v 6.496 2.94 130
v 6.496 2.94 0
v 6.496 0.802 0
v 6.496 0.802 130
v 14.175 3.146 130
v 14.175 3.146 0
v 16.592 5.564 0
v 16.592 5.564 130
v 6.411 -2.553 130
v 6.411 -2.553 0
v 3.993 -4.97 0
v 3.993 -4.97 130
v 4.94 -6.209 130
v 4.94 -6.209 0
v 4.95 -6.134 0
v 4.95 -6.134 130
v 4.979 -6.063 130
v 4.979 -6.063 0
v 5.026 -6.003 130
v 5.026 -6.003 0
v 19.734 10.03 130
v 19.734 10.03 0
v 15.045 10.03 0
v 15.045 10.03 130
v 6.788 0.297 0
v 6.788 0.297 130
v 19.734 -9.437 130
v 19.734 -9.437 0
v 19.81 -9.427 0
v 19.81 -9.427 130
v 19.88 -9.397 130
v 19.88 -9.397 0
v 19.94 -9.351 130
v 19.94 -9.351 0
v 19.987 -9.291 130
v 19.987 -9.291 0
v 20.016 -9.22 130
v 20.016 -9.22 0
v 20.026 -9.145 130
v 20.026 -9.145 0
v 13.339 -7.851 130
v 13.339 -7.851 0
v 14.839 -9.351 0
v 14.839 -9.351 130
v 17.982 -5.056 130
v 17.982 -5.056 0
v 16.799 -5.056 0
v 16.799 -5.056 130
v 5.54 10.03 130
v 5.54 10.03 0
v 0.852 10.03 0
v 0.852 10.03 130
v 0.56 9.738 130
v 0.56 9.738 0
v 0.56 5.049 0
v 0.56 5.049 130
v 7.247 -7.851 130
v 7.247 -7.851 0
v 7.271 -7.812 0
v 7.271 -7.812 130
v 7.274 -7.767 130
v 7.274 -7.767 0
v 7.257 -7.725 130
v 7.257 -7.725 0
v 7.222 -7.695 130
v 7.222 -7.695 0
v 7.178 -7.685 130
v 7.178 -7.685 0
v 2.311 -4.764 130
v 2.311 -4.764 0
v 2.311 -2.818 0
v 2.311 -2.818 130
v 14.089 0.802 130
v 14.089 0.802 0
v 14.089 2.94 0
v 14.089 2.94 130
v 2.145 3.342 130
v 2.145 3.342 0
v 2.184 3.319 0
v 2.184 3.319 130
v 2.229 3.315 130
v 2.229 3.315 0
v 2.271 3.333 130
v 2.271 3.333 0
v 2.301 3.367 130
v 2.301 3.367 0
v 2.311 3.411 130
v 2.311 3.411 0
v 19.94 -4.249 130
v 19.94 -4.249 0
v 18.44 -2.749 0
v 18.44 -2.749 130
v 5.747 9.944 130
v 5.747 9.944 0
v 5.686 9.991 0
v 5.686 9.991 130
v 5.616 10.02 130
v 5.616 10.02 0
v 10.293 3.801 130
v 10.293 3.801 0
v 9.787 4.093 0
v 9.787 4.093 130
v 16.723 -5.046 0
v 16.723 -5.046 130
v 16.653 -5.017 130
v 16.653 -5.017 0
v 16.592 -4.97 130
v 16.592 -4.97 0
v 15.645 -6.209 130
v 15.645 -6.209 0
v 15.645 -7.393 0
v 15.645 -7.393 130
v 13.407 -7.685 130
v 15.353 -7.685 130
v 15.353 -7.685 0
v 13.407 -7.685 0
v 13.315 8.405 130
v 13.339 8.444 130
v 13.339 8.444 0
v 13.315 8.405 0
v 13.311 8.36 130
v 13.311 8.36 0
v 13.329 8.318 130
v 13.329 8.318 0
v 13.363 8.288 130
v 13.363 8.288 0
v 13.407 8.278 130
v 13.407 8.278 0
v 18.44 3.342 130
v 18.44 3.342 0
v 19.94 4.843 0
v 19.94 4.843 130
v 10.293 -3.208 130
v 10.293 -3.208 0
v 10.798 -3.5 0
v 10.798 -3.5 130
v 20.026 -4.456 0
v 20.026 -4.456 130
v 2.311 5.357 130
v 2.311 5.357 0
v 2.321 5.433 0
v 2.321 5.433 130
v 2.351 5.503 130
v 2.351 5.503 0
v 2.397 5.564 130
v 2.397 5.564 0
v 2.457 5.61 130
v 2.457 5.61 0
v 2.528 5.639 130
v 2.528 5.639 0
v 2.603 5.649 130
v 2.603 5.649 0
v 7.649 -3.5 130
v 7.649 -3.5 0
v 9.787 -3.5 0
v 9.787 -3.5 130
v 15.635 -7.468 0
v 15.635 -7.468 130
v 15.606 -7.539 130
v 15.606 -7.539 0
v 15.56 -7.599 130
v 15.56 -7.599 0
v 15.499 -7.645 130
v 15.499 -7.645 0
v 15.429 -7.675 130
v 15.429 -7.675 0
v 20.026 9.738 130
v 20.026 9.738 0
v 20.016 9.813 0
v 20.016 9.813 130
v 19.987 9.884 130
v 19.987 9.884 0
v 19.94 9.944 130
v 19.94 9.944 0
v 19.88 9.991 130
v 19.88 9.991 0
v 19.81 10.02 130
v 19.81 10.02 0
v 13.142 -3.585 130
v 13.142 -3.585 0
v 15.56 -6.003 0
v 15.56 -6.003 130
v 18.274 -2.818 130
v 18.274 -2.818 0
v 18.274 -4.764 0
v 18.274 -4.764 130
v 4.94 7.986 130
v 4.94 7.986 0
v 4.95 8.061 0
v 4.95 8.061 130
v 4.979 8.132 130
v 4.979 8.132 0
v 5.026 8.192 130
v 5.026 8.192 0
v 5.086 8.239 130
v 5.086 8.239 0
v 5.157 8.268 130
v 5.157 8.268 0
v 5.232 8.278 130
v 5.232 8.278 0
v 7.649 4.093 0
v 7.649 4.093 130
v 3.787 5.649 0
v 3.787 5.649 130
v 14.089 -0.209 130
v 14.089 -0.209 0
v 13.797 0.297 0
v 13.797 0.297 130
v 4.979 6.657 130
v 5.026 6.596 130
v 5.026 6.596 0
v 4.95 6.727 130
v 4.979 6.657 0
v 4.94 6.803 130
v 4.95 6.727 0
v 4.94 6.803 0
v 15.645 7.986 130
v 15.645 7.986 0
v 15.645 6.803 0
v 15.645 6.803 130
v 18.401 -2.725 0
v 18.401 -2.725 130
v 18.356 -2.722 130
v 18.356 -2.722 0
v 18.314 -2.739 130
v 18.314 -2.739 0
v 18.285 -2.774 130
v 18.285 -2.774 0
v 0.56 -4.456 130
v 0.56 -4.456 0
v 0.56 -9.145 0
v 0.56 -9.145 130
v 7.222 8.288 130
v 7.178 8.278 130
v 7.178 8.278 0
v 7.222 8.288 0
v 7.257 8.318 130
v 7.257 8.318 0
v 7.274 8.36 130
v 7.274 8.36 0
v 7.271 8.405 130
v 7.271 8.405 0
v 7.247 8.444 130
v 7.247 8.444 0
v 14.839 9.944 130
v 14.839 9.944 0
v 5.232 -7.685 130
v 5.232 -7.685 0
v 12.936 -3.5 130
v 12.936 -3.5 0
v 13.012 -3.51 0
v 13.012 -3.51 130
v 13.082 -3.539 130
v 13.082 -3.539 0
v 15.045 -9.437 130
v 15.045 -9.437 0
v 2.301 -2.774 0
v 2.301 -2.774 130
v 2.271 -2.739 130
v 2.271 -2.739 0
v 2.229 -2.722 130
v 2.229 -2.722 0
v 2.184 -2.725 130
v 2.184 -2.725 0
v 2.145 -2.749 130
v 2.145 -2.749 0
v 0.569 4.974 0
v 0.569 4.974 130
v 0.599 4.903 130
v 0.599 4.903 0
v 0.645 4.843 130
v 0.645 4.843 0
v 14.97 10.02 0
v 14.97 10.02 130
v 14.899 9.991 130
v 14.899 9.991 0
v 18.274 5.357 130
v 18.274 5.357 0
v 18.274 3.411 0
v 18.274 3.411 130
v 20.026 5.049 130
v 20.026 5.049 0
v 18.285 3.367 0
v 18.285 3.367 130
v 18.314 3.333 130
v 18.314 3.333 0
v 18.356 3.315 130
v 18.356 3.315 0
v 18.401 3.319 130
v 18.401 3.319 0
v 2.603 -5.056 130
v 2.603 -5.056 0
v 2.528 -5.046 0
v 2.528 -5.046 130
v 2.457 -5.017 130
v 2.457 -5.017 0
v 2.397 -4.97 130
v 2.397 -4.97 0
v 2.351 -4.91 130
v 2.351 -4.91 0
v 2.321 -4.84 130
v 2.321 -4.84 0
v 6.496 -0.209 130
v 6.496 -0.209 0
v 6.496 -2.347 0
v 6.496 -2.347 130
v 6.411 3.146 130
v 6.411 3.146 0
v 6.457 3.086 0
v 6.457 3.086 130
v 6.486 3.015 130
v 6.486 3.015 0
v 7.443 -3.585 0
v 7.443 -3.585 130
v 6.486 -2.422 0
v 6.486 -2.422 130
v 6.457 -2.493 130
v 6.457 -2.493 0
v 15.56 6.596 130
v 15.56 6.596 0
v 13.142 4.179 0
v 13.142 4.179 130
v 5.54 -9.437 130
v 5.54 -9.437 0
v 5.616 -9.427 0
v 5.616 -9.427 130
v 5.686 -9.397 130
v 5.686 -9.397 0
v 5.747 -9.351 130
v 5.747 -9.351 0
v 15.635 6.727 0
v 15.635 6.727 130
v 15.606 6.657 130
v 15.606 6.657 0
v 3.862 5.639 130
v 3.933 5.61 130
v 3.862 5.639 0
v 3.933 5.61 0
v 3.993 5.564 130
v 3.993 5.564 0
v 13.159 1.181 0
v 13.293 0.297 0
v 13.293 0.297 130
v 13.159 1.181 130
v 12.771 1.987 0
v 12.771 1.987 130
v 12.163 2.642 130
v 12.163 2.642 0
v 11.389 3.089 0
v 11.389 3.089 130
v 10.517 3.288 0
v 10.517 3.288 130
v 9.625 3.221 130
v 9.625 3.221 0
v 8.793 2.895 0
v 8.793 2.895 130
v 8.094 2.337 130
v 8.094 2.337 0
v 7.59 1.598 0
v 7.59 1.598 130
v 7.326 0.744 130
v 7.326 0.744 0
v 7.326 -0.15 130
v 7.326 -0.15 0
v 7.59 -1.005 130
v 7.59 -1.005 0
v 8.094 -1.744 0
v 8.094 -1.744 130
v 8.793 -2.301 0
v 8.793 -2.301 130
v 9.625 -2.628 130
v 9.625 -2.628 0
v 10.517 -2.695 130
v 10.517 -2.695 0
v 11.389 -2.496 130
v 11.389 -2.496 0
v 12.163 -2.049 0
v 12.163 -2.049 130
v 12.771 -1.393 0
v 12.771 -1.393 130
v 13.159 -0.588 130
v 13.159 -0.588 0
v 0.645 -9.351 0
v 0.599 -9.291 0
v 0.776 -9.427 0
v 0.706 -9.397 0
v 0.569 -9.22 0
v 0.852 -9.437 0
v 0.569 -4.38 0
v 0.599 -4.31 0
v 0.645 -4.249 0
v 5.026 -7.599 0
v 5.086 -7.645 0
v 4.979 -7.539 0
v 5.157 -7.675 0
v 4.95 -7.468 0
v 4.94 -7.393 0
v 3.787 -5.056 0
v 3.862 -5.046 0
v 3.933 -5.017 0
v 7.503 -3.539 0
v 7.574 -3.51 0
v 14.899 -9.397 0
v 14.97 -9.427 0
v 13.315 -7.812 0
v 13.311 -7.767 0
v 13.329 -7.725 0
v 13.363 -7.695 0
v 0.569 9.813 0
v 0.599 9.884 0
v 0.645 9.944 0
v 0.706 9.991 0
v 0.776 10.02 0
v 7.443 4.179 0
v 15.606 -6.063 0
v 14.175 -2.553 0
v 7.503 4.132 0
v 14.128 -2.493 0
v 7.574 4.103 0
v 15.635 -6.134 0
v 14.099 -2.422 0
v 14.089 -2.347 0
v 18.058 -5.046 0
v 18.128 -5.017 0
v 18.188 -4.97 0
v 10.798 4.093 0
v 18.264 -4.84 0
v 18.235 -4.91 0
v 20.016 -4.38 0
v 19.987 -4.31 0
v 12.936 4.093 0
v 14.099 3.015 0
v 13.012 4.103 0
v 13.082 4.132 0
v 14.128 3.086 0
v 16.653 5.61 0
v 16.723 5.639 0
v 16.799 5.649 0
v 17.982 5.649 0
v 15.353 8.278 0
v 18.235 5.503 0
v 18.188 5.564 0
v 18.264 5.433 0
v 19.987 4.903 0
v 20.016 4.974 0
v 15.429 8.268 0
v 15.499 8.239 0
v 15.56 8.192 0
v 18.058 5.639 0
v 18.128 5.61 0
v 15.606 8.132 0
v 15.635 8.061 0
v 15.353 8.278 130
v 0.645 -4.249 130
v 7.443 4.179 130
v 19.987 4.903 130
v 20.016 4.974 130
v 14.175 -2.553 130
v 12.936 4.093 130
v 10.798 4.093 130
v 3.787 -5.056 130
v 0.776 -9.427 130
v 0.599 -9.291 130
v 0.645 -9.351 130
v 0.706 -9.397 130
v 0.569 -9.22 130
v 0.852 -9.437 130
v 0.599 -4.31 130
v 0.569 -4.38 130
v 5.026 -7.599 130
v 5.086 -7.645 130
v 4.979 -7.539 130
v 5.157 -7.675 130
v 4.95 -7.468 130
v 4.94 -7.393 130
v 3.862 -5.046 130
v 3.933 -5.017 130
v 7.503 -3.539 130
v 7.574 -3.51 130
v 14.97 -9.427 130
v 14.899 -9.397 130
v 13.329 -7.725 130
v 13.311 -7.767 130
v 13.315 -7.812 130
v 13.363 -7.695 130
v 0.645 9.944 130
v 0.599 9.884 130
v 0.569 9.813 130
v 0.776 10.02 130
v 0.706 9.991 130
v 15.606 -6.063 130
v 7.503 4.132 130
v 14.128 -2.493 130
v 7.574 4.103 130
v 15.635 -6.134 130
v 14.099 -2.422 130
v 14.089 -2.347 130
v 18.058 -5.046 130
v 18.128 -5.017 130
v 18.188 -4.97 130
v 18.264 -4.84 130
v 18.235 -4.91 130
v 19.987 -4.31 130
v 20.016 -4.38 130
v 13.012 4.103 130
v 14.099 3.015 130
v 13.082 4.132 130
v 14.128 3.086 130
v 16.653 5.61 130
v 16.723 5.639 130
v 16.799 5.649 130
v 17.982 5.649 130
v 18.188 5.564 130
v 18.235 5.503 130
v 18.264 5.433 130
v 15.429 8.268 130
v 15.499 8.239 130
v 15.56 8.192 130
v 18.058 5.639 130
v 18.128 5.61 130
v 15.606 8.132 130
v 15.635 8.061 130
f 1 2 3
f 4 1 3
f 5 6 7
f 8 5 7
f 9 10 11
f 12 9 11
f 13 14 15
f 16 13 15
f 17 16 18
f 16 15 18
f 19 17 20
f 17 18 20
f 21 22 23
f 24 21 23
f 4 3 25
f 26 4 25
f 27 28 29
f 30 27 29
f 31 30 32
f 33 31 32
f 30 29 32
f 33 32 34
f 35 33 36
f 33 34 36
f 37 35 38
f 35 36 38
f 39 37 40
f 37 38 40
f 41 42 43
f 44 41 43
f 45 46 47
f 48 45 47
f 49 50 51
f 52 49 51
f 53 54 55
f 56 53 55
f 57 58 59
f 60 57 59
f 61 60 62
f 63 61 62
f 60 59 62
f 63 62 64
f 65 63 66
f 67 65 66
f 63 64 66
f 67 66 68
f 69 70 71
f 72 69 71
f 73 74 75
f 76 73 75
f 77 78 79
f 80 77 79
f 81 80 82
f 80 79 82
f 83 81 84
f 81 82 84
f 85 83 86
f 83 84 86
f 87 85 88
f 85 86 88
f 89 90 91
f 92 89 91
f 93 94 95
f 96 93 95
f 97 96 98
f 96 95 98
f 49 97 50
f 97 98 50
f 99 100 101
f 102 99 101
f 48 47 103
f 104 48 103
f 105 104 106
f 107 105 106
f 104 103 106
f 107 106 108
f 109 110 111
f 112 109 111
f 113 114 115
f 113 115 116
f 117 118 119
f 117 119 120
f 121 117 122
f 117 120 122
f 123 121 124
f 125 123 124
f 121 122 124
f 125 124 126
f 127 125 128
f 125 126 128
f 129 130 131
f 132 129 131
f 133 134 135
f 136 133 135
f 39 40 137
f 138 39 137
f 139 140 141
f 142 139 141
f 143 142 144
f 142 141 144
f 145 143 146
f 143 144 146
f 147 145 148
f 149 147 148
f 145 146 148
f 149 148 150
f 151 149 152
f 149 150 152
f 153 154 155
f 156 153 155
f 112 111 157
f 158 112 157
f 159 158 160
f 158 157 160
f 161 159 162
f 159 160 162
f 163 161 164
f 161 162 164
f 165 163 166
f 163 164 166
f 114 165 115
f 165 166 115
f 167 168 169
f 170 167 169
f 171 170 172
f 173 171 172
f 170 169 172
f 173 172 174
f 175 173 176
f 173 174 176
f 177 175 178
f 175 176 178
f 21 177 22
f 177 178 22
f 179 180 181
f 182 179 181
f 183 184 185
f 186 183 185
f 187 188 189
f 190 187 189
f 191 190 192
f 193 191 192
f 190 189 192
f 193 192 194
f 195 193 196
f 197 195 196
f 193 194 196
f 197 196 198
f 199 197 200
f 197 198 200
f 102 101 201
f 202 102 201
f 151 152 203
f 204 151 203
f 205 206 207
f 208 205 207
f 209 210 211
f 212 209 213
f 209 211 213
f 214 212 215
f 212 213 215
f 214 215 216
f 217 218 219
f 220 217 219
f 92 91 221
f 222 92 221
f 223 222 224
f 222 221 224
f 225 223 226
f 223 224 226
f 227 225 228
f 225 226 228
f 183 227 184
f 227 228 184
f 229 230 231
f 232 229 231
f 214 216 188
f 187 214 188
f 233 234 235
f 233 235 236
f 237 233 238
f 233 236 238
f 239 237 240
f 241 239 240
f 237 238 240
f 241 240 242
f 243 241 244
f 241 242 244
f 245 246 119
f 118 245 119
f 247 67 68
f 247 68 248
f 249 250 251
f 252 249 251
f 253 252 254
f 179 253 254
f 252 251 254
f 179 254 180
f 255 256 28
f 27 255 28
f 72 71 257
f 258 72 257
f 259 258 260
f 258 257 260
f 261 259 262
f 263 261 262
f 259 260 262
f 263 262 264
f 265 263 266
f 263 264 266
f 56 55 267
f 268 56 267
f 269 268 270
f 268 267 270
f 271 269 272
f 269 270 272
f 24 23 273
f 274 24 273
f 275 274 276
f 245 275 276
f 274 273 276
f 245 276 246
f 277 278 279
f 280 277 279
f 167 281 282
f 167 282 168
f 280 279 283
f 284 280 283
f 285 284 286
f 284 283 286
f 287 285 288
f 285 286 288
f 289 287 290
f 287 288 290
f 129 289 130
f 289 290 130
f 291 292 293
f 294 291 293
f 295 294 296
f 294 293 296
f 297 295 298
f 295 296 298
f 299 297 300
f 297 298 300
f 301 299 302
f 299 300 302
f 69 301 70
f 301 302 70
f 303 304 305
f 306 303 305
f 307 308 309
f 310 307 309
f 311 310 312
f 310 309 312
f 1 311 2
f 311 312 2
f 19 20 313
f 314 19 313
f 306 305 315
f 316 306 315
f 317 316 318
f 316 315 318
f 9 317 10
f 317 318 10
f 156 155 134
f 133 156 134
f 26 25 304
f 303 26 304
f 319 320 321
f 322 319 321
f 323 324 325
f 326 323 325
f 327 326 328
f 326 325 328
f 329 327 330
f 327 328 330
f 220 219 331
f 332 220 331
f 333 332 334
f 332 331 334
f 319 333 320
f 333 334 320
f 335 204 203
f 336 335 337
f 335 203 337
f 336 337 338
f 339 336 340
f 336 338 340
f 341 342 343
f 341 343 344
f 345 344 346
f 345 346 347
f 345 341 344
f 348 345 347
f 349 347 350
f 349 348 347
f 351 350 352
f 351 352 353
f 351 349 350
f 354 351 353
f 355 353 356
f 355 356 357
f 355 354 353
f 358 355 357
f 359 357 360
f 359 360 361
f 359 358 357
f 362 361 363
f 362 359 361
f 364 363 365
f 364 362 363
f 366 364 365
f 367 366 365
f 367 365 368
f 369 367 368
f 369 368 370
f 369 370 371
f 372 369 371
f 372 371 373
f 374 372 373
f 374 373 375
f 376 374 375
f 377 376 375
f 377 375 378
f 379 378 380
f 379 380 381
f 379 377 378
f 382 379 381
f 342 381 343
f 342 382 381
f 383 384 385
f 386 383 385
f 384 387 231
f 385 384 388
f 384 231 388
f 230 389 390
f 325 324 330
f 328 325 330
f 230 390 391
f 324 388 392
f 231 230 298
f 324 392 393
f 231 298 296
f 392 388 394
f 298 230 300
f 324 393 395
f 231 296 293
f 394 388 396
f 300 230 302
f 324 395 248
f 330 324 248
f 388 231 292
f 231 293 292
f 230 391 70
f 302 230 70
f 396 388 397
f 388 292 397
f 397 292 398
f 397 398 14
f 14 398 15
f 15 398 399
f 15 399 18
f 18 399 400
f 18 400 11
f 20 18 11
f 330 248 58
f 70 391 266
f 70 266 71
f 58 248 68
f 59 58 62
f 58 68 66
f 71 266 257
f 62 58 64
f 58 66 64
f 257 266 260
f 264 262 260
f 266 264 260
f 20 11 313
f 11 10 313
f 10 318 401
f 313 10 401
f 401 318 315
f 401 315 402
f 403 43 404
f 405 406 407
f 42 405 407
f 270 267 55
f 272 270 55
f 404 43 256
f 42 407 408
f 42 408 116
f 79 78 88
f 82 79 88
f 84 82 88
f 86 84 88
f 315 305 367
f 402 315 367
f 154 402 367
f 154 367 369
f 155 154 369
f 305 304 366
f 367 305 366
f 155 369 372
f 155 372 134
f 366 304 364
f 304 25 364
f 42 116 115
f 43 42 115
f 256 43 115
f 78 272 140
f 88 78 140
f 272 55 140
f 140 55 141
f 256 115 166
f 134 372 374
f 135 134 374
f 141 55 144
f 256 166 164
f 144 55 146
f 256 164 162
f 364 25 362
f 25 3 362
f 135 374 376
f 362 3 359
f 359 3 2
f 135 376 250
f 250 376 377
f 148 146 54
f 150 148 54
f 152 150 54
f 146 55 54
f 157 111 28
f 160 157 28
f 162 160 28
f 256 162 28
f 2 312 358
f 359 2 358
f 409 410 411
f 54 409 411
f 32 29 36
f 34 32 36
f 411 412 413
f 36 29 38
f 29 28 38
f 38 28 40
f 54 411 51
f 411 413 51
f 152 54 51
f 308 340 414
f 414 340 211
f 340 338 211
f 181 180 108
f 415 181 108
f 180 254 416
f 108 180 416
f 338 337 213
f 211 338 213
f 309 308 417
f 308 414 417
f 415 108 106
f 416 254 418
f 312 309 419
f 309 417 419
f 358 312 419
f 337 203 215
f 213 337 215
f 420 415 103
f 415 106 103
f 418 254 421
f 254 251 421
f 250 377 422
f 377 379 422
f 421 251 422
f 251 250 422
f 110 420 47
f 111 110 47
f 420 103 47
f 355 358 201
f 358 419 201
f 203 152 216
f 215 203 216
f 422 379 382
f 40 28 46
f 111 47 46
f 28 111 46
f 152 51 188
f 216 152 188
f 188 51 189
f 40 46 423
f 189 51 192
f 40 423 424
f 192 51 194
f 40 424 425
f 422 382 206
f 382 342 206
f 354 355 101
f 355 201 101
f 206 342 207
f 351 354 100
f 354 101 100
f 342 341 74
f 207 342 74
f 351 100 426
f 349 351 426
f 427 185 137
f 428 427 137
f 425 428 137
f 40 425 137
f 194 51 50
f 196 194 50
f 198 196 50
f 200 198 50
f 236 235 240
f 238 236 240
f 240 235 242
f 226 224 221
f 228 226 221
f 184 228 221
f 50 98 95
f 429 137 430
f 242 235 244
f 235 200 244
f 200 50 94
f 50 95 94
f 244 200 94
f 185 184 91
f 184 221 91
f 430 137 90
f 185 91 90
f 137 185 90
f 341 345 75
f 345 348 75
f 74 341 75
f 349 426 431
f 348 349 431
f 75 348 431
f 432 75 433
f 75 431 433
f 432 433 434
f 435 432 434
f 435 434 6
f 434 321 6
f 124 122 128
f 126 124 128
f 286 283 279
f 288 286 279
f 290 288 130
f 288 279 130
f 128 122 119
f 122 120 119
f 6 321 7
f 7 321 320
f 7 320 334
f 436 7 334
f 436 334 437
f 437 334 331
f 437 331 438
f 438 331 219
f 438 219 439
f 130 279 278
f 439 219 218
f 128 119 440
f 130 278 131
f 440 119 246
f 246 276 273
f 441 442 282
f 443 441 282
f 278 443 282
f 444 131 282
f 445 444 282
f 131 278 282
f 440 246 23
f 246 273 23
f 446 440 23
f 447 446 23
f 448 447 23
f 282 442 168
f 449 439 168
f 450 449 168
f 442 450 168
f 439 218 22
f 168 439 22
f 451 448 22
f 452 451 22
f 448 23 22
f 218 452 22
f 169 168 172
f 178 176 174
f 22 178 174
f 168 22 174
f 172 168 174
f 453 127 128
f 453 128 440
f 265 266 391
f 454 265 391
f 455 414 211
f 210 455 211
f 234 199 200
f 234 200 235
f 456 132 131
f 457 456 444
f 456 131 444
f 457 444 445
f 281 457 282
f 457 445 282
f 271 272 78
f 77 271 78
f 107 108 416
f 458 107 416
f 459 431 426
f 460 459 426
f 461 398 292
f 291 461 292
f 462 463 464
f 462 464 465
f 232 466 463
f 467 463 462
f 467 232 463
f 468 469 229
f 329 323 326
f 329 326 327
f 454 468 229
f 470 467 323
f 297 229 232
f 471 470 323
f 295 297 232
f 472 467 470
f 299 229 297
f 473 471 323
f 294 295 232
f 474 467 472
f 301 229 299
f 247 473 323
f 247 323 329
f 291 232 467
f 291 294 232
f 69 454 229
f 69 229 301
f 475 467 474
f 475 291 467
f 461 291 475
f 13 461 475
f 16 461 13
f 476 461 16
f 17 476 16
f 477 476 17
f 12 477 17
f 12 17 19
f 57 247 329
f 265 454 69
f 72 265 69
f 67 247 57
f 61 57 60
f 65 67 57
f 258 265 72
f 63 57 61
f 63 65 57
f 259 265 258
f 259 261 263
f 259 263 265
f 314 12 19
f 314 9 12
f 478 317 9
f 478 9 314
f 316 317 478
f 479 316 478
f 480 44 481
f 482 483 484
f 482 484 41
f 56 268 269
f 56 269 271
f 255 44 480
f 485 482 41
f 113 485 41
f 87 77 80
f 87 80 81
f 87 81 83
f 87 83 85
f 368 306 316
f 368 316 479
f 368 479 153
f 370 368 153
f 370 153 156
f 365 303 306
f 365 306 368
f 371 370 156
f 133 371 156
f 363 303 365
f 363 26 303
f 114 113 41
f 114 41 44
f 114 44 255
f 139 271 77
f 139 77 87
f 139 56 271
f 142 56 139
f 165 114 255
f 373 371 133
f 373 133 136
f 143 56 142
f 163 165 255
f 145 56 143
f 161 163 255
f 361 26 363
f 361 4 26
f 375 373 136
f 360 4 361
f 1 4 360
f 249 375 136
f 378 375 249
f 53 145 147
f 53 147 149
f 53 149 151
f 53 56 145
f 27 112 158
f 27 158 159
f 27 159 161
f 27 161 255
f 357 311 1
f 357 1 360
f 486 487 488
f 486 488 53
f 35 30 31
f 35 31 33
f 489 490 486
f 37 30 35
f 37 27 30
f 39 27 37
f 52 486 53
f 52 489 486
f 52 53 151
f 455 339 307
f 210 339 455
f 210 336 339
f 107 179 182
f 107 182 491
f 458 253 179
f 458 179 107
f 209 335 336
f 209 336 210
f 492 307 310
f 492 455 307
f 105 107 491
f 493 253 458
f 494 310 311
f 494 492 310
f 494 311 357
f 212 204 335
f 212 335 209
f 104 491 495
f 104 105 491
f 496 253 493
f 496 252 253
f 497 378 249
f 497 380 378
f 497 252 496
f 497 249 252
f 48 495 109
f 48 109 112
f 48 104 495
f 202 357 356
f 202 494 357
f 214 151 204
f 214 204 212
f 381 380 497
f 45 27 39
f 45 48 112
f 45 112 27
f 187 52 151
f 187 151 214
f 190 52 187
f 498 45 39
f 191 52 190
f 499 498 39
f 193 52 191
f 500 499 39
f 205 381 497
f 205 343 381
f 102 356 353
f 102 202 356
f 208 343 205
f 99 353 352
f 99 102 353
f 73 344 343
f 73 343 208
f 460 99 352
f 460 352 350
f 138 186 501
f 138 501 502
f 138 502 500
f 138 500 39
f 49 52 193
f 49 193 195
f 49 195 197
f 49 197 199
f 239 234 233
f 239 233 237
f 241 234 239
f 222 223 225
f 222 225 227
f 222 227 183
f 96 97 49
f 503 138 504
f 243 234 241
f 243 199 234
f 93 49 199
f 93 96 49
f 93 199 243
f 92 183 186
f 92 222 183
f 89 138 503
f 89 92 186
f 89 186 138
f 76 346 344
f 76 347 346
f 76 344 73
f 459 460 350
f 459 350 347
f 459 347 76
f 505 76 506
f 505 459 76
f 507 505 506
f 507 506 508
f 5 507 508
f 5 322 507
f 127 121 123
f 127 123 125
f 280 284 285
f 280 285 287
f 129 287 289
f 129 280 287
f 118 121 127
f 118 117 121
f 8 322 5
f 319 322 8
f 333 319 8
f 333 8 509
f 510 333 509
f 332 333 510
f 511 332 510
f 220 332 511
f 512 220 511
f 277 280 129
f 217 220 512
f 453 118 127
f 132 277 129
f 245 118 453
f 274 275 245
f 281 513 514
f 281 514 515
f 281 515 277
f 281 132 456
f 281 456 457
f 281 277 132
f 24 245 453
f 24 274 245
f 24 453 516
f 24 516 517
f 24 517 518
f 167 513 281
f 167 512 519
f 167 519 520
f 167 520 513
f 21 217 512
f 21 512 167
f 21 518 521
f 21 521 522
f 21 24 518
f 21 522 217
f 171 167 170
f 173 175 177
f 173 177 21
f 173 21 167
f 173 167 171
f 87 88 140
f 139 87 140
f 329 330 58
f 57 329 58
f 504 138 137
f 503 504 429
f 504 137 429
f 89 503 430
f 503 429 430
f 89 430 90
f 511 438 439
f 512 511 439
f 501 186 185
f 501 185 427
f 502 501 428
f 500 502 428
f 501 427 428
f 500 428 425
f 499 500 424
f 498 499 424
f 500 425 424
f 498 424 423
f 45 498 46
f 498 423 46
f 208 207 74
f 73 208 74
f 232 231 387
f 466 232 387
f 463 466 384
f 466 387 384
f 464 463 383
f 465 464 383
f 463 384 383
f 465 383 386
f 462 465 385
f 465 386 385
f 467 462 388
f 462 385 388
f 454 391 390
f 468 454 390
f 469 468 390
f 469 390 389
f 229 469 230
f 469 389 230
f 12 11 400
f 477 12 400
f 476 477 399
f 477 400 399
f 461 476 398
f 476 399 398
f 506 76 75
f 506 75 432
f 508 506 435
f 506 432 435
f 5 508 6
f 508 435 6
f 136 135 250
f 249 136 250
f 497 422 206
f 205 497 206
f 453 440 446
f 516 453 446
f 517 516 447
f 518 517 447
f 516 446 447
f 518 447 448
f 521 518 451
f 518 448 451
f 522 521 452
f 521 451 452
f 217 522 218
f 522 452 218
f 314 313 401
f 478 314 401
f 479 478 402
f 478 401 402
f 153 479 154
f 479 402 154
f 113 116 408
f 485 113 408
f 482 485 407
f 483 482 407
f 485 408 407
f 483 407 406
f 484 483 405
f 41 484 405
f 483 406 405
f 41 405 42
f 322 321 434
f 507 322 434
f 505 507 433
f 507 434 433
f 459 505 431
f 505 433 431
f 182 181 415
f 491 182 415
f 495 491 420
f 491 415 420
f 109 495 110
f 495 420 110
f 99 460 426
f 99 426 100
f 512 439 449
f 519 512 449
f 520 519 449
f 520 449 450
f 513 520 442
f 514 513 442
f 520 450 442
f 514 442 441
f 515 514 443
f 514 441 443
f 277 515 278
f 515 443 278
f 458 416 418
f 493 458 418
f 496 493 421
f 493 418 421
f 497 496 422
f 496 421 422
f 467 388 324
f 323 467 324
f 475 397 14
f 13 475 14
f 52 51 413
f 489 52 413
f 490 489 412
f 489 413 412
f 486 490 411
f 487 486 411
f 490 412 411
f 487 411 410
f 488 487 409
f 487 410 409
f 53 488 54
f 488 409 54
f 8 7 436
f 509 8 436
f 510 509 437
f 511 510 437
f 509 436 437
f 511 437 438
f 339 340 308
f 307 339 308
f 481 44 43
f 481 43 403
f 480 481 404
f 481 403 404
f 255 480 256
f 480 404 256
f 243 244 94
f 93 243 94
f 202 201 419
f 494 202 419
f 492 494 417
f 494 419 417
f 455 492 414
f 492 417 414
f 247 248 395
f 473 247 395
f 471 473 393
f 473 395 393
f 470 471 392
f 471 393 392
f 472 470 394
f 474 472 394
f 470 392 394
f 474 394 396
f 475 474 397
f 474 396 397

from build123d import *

# Parameters (mm, degrees)
ESQUISSE1_R        = 3
BOSS_EXTRU_1_DEPTH = 130


with BuildPart() as part:
    # Esquisse1 → Boss.-Extru.1 (new body)
    with BuildSketch(Plane.XY):
        with BuildLine():
            Line((18.273972397, -2.817988329), (18.273972397, -4.763988771))
            ThreePointArc((18.273972397, -4.763988771), (18.188448617, -4.970461441), (17.981975947, -5.055985222))
            Line((17.981975947, -5.055985222), (16.798674025, -5.055985222))
            ThreePointArc((16.798674025, -5.055985222), (16.686931822, -5.033758315), (16.592201355, -4.970461441))
            Line((16.592201355, -4.970461441), (14.174856283, -2.553116369))
            ThreePointArc((14.174856283, -2.553116369), (14.111559409, -2.458385902), (14.089332502, -2.346643699))
            Line((14.089332502, -2.346643699), (14.089332502, -0.209112213))
            Line((14.089332502, -0.209112213), (13.797336052, 0.296640474))
            Line((13.797336052, 0.296640474), (14.089332502, 0.802393162))
            Line((14.089332502, 0.802393162), (14.089332502, 2.939924647))
            ThreePointArc((14.089332502, 2.939924647), (14.111559409, 3.051666851), (14.174856283, 3.146397317))
            Line((14.174856283, 3.146397317), (16.592201355, 5.56374239))
            ThreePointArc((16.592201355, 5.56374239), (16.686931822, 5.627039264), (16.798674025, 5.64926617))
            Line((16.798674025, 5.64926617), (17.981975947, 5.64926617))
            ThreePointArc((17.981975947, 5.64926617), (18.188448617, 5.56374239), (18.273972397, 5.35726972))
            Line((18.273972397, 5.35726972), (18.273972397, 3.411269278))
            ThreePointArc((18.273972397, 3.411269278), (18.334057146, 3.321346096), (18.440128771, 3.342445054))
            Line((18.440128771, 3.342445054), (19.940427319, 4.842743602))
            ThreePointArc((19.940427319, 4.842743602), (20.003724193, 4.937474069), (20.025951099, 5.049216272))
            Line((20.025951099, 5.049216272), (20.025951099, 9.737859034))
            ThreePointArc((20.025951099, 9.737859034), (19.940427319, 9.944331704), (19.733954649, 10.029855484))
            Line((19.733954649, 10.029855484), (15.045311887, 10.029855484))
            ThreePointArc((15.045311887, 10.029855484), (14.933569683, 10.007628578), (14.838839217, 9.944331704))
            Line((14.838839217, 9.944331704), (13.338540669, 8.444033156))
            ThreePointArc((13.338540669, 8.444033156), (13.317441711, 8.337961531), (13.407364892, 8.277876782))
            Line((13.407364892, 8.277876782), (15.353365335, 8.277876782))
            ThreePointArc((15.353365335, 8.277876782), (15.559838005, 8.192353002), (15.645361785, 7.985880332))
            Line((15.645361785, 7.985880332), (15.645361785, 6.802578411))
            ThreePointArc((15.645361785, 6.802578411), (15.623134879, 6.690836207), (15.559838005, 6.596105741))
            Line((15.559838005, 6.596105741), (13.142492932, 4.178760668))
            ThreePointArc((13.142492932, 4.178760668), (13.047762466, 4.115463794), (12.936020262, 4.093236888))
            Line((12.936020262, 4.093236888), (10.798488777, 4.093236888))
            Line((10.798488777, 4.093236888), (10.292736089, 3.801240437))
            Line((10.292736089, 3.801240437), (9.786983402, 4.093236888))
            Line((9.786983402, 4.093236888), (7.649451916, 4.093236888))
            ThreePointArc((7.649451916, 4.093236888), (7.537709712, 4.115463794), (7.442979246, 4.178760668))
            Line((7.442979246, 4.178760668), (5.025634173, 6.596105741))
            ThreePointArc((5.025634173, 6.596105741), (4.962337299, 6.690836207), (4.940110393, 6.802578411))
            Line((4.940110393, 6.802578411), (4.940110393, 7.985880332))
            ThreePointArc((4.940110393, 7.985880332), (5.025634173, 8.192353002), (5.232106843, 8.277876782))
            Line((5.232106843, 8.277876782), (7.178107286, 8.277876782))
            ThreePointArc((7.178107286, 8.277876782), (7.268030467, 8.337961531), (7.246931509, 8.444033156))
            Line((7.246931509, 8.444033156), (5.746632961, 9.944331704))
            ThreePointArc((5.746632961, 9.944331704), (5.651902495, 10.007628578), (5.540160291, 10.029855484))
            Line((5.540160291, 10.029855484), (0.85151753, 10.029855484))
            ThreePointArc((0.85151753, 10.029855484), (0.64504486, 9.944331704), (0.559521079, 9.737859034))
            Line((0.559521079, 9.737859034), (0.559521079, 5.049216272))
            ThreePointArc((0.559521079, 5.049216272), (0.581747986, 4.937474069), (0.64504486, 4.842743602))
            Line((0.64504486, 4.842743602), (2.145343408, 3.342445054))
            ThreePointArc((2.145343408, 3.342445054), (2.251415032, 3.321346096), (2.311499781, 3.411269278))
            Line((2.311499781, 3.411269278), (2.311499781, 5.35726972))
            ThreePointArc((2.311499781, 5.35726972), (2.397023561, 5.56374239), (2.603496231, 5.64926617))
            Line((2.603496231, 5.64926617), (3.786798153, 5.64926617))
            ThreePointArc((3.786798153, 5.64926617), (3.898540357, 5.627039264), (3.993270823, 5.56374239))
            Line((3.993270823, 5.56374239), (6.410615896, 3.146397317))
            ThreePointArc((6.410615896, 3.146397317), (6.47391277, 3.051666851), (6.496139676, 2.939924647))
            Line((6.496139676, 2.939924647), (6.496139676, 0.802393162))
            Line((6.496139676, 0.802393162), (6.788136126, 0.296640474))
            Line((6.788136126, 0.296640474), (6.496139676, -0.209112213))
            Line((6.496139676, -0.209112213), (6.496139676, -2.346643699))
            ThreePointArc((6.496139676, -2.346643699), (6.47391277, -2.458385902), (6.410615896, -2.553116369))
            Line((6.410615896, -2.553116369), (3.993270823, -4.970461441))
            ThreePointArc((3.993270823, -4.970461441), (3.898540357, -5.033758315), (3.786798153, -5.055985222))
            Line((3.786798153, -5.055985222), (2.603496231, -5.055985222))
            ThreePointArc((2.603496231, -5.055985222), (2.397023561, -4.970461441), (2.311499781, -4.763988771))
            Line((2.311499781, -4.763988771), (2.311499781, -2.817988329))
            ThreePointArc((2.311499781, -2.817988329), (2.251415032, -2.728065147), (2.145343408, -2.749164105))
            Line((2.145343408, -2.749164105), (0.64504486, -4.249462653))
            ThreePointArc((0.64504486, -4.249462653), (0.581747986, -4.34419312), (0.559521079, -4.455935324))
            Line((0.559521079, -4.455935324), (0.559521079, -9.144578085))
            ThreePointArc((0.559521079, -9.144578085), (0.64504486, -9.351050755), (0.85151753, -9.436574535))
            Line((0.85151753, -9.436574535), (5.540160291, -9.436574535))
            ThreePointArc((5.540160291, -9.436574535), (5.651902495, -9.414347629), (5.746632961, -9.351050755))
            Line((5.746632961, -9.351050755), (7.246931509, -7.850752207))
            ThreePointArc((7.246931509, -7.850752207), (7.268030467, -7.744680582), (7.178107286, -7.684595834))
            Line((7.178107286, -7.684595834), (5.232106843, -7.684595834))
            ThreePointArc((5.232106843, -7.684595834), (5.025634173, -7.599072053), (4.940110393, -7.392599383))
            Line((4.940110393, -7.392599383), (4.940110393, -6.209297462))
            ThreePointArc((4.940110393, -6.209297462), (4.962337299, -6.097555258), (5.025634173, -6.002824792))
            Line((5.025634173, -6.002824792), (7.442979246, -3.585479719))
            ThreePointArc((7.442979246, -3.585479719), (7.537709712, -3.522182845), (7.649451916, -3.499955939))
            Line((7.649451916, -3.499955939), (9.786983402, -3.499955939))
            Line((9.786983402, -3.499955939), (10.292736089, -3.207959489))
            Line((10.292736089, -3.207959489), (10.798488777, -3.499955939))
            Line((10.798488777, -3.499955939), (12.936020262, -3.499955939))
            ThreePointArc((12.936020262, -3.499955939), (13.047762466, -3.522182845), (13.142492932, -3.585479719))
            Line((13.142492932, -3.585479719), (15.559838005, -6.002824792))
            ThreePointArc((15.559838005, -6.002824792), (15.623134879, -6.097555258), (15.645361785, -6.209297462))
            Line((15.645361785, -6.209297462), (15.645361785, -7.392599383))
            ThreePointArc((15.645361785, -7.392599383), (15.559838005, -7.599072053), (15.353365335, -7.684595834))
            Line((15.353365335, -7.684595834), (13.407364892, -7.684595834))
            ThreePointArc((13.407364892, -7.684595834), (13.317441711, -7.744680582), (13.338540669, -7.850752207))
            Line((13.338540669, -7.850752207), (14.838839217, -9.351050755))
            ThreePointArc((14.838839217, -9.351050755), (14.933569683, -9.414347629), (15.045311887, -9.436574535))
            Line((15.045311887, -9.436574535), (19.733954649, -9.436574535))
            ThreePointArc((19.733954649, -9.436574535), (19.940427319, -9.351050755), (20.025951099, -9.144578085))
            Line((20.025951099, -9.144578085), (20.025951099, -4.455935324))
            ThreePointArc((20.025951099, -4.455935324), (20.003724193, -4.34419312), (19.940427319, -4.249462653))
            Line((19.940427319, -4.249462653), (18.440128771, -2.749164105))
            ThreePointArc((18.440128771, -2.749164105), (18.334057146, -2.728065147), (18.273972397, -2.817988329))
        make_face()
        with Locations((10.292736089, 0.296640474)):
            Circle(ESQUISSE1_R, mode=Mode.SUBTRACT)
    extrude(amount=BOSS_EXTRU_1_DEPTH)


solid = part.part
